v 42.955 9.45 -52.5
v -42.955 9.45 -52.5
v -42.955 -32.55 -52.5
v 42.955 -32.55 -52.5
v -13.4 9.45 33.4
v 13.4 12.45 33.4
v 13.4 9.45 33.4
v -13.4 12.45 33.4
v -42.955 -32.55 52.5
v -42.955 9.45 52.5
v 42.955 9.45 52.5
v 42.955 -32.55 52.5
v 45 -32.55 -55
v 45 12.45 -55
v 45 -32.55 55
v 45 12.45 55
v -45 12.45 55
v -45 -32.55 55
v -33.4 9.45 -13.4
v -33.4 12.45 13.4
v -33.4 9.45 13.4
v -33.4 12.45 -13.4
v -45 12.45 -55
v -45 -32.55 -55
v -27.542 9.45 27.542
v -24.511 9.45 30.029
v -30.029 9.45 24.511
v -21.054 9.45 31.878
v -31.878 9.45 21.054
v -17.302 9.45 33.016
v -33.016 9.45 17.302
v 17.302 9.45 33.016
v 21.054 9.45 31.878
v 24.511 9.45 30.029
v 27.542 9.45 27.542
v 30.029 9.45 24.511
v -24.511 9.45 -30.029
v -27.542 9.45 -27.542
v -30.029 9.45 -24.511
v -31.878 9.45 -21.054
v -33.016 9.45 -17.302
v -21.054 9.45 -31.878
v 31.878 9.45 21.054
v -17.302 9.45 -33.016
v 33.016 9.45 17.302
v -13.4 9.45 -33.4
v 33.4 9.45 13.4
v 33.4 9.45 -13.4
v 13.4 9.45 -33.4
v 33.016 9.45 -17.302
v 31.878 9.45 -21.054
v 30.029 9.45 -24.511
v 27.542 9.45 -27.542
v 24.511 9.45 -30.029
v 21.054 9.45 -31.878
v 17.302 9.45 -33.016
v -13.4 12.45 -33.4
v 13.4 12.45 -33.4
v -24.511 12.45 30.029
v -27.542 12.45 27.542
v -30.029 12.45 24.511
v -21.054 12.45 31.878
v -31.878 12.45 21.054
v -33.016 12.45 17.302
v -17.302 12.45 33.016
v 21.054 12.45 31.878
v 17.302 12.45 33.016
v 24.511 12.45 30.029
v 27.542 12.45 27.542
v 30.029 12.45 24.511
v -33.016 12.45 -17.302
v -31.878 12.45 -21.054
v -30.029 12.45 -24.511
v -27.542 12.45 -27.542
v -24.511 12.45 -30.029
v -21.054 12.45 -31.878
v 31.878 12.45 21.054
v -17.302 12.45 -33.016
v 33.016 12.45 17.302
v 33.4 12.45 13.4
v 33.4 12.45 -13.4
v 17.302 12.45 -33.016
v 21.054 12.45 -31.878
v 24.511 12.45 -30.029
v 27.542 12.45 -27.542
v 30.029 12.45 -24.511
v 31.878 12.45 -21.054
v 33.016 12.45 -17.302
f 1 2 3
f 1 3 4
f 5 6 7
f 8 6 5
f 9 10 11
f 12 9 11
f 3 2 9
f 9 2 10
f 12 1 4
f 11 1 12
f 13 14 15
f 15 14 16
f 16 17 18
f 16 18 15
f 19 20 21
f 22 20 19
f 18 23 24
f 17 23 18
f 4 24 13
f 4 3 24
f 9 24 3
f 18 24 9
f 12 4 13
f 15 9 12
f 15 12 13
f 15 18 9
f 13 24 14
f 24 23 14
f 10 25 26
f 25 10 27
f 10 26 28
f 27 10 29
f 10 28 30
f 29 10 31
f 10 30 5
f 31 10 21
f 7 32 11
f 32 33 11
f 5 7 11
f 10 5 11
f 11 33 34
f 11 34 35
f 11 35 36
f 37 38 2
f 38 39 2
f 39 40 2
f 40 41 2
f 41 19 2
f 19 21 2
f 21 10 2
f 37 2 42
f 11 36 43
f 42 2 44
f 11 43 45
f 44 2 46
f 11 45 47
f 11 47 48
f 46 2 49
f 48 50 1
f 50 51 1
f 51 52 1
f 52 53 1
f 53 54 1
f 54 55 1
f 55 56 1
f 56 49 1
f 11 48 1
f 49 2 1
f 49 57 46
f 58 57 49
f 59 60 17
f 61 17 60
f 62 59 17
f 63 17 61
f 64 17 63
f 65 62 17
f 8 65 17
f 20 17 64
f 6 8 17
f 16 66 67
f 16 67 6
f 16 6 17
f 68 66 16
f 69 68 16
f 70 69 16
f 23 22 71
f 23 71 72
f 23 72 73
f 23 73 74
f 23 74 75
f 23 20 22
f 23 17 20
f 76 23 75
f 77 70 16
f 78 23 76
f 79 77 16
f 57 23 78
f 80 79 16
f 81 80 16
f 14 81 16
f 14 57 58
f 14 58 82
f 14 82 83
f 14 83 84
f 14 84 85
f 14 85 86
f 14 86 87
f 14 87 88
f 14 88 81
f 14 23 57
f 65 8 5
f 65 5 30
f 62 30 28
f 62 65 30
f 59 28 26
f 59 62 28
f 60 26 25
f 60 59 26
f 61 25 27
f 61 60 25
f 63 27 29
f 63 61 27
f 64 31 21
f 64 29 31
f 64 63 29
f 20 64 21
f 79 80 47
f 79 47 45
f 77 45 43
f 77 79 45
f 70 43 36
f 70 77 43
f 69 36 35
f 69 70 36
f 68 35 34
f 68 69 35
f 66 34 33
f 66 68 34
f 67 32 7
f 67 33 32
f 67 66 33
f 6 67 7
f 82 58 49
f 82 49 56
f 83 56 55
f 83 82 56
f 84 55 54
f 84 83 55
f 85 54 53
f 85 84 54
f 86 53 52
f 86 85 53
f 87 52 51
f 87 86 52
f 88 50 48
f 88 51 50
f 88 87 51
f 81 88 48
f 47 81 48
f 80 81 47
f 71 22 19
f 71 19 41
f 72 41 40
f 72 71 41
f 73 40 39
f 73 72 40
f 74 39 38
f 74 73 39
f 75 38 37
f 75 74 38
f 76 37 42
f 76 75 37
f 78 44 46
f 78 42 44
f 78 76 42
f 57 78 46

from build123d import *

# Parameters (mm, degrees)
SKETCH1_W           = 90
SKETCH1_H           = 110
BOSS_EXTRUDE1_DEPTH = 3
CUT_EXTRUDE5_DEPTH  = 72.126647608
SKETCH3_W           = 90
SKETCH3_H           = 110
SKETCH3_W_2         = 85.90909091
SKETCH3_H_2         = 105
BOSS_EXTRUDE2_DEPTH = 42


with BuildPart() as part:
    # Sketch1 → Boss-Extrude1 (new body)
    with BuildSketch(Plane(origin=(0, 12.45, 0), x_dir=(1, 0, 0), z_dir=(0, 1, 0))):
        Rectangle(SKETCH1_W, SKETCH1_H)
    extrude(amount=-BOSS_EXTRUDE1_DEPTH)

    # Sketch2 → Cut-Extrude5 (cut, through all)
    with BuildSketch(Plane(origin=(0, 12.45, 0), x_dir=(1, 0, 0), z_dir=(0, 1, 0))):
        with BuildLine():
            Line((-13.4, 33.399999142), (13.4, 33.399999142))
            ThreePointArc((13.4, 33.399999142), (27.542135624, 27.542134765), (33.4, 13.399999142))
            Line((33.4, 13.399999142), (33.4, -13.399999142))
            ThreePointArc((33.4, -13.399999142), (27.542135624, -27.542134765), (13.4, -33.399999142))
            Line((13.4, -33.399999142), (-13.4, -33.399999142))
            ThreePointArc((-13.4, -33.399999142), (-27.542135624, -27.542134765), (-33.4, -13.399999142))
            Line((-33.4, -13.399999142), (-33.4, 13.399999142))
            ThreePointArc((-33.4, 13.399999142), (-27.542135624, 27.542134765), (-13.4, 33.399999142))
        make_face()
    extrude(amount=-CUT_EXTRUDE5_DEPTH, mode=Mode.SUBTRACT)

    # Sketch3 → Boss-Extrude2 (add)
    with BuildSketch(Plane.XZ.offset(-9.45)):
        Rectangle(SKETCH3_W, SKETCH3_H)
        Rectangle(SKETCH3_W_2, SKETCH3_H_2, mode=Mode.SUBTRACT)
    extrude(amount=BOSS_EXTRUDE2_DEPTH)


solid = part.part
